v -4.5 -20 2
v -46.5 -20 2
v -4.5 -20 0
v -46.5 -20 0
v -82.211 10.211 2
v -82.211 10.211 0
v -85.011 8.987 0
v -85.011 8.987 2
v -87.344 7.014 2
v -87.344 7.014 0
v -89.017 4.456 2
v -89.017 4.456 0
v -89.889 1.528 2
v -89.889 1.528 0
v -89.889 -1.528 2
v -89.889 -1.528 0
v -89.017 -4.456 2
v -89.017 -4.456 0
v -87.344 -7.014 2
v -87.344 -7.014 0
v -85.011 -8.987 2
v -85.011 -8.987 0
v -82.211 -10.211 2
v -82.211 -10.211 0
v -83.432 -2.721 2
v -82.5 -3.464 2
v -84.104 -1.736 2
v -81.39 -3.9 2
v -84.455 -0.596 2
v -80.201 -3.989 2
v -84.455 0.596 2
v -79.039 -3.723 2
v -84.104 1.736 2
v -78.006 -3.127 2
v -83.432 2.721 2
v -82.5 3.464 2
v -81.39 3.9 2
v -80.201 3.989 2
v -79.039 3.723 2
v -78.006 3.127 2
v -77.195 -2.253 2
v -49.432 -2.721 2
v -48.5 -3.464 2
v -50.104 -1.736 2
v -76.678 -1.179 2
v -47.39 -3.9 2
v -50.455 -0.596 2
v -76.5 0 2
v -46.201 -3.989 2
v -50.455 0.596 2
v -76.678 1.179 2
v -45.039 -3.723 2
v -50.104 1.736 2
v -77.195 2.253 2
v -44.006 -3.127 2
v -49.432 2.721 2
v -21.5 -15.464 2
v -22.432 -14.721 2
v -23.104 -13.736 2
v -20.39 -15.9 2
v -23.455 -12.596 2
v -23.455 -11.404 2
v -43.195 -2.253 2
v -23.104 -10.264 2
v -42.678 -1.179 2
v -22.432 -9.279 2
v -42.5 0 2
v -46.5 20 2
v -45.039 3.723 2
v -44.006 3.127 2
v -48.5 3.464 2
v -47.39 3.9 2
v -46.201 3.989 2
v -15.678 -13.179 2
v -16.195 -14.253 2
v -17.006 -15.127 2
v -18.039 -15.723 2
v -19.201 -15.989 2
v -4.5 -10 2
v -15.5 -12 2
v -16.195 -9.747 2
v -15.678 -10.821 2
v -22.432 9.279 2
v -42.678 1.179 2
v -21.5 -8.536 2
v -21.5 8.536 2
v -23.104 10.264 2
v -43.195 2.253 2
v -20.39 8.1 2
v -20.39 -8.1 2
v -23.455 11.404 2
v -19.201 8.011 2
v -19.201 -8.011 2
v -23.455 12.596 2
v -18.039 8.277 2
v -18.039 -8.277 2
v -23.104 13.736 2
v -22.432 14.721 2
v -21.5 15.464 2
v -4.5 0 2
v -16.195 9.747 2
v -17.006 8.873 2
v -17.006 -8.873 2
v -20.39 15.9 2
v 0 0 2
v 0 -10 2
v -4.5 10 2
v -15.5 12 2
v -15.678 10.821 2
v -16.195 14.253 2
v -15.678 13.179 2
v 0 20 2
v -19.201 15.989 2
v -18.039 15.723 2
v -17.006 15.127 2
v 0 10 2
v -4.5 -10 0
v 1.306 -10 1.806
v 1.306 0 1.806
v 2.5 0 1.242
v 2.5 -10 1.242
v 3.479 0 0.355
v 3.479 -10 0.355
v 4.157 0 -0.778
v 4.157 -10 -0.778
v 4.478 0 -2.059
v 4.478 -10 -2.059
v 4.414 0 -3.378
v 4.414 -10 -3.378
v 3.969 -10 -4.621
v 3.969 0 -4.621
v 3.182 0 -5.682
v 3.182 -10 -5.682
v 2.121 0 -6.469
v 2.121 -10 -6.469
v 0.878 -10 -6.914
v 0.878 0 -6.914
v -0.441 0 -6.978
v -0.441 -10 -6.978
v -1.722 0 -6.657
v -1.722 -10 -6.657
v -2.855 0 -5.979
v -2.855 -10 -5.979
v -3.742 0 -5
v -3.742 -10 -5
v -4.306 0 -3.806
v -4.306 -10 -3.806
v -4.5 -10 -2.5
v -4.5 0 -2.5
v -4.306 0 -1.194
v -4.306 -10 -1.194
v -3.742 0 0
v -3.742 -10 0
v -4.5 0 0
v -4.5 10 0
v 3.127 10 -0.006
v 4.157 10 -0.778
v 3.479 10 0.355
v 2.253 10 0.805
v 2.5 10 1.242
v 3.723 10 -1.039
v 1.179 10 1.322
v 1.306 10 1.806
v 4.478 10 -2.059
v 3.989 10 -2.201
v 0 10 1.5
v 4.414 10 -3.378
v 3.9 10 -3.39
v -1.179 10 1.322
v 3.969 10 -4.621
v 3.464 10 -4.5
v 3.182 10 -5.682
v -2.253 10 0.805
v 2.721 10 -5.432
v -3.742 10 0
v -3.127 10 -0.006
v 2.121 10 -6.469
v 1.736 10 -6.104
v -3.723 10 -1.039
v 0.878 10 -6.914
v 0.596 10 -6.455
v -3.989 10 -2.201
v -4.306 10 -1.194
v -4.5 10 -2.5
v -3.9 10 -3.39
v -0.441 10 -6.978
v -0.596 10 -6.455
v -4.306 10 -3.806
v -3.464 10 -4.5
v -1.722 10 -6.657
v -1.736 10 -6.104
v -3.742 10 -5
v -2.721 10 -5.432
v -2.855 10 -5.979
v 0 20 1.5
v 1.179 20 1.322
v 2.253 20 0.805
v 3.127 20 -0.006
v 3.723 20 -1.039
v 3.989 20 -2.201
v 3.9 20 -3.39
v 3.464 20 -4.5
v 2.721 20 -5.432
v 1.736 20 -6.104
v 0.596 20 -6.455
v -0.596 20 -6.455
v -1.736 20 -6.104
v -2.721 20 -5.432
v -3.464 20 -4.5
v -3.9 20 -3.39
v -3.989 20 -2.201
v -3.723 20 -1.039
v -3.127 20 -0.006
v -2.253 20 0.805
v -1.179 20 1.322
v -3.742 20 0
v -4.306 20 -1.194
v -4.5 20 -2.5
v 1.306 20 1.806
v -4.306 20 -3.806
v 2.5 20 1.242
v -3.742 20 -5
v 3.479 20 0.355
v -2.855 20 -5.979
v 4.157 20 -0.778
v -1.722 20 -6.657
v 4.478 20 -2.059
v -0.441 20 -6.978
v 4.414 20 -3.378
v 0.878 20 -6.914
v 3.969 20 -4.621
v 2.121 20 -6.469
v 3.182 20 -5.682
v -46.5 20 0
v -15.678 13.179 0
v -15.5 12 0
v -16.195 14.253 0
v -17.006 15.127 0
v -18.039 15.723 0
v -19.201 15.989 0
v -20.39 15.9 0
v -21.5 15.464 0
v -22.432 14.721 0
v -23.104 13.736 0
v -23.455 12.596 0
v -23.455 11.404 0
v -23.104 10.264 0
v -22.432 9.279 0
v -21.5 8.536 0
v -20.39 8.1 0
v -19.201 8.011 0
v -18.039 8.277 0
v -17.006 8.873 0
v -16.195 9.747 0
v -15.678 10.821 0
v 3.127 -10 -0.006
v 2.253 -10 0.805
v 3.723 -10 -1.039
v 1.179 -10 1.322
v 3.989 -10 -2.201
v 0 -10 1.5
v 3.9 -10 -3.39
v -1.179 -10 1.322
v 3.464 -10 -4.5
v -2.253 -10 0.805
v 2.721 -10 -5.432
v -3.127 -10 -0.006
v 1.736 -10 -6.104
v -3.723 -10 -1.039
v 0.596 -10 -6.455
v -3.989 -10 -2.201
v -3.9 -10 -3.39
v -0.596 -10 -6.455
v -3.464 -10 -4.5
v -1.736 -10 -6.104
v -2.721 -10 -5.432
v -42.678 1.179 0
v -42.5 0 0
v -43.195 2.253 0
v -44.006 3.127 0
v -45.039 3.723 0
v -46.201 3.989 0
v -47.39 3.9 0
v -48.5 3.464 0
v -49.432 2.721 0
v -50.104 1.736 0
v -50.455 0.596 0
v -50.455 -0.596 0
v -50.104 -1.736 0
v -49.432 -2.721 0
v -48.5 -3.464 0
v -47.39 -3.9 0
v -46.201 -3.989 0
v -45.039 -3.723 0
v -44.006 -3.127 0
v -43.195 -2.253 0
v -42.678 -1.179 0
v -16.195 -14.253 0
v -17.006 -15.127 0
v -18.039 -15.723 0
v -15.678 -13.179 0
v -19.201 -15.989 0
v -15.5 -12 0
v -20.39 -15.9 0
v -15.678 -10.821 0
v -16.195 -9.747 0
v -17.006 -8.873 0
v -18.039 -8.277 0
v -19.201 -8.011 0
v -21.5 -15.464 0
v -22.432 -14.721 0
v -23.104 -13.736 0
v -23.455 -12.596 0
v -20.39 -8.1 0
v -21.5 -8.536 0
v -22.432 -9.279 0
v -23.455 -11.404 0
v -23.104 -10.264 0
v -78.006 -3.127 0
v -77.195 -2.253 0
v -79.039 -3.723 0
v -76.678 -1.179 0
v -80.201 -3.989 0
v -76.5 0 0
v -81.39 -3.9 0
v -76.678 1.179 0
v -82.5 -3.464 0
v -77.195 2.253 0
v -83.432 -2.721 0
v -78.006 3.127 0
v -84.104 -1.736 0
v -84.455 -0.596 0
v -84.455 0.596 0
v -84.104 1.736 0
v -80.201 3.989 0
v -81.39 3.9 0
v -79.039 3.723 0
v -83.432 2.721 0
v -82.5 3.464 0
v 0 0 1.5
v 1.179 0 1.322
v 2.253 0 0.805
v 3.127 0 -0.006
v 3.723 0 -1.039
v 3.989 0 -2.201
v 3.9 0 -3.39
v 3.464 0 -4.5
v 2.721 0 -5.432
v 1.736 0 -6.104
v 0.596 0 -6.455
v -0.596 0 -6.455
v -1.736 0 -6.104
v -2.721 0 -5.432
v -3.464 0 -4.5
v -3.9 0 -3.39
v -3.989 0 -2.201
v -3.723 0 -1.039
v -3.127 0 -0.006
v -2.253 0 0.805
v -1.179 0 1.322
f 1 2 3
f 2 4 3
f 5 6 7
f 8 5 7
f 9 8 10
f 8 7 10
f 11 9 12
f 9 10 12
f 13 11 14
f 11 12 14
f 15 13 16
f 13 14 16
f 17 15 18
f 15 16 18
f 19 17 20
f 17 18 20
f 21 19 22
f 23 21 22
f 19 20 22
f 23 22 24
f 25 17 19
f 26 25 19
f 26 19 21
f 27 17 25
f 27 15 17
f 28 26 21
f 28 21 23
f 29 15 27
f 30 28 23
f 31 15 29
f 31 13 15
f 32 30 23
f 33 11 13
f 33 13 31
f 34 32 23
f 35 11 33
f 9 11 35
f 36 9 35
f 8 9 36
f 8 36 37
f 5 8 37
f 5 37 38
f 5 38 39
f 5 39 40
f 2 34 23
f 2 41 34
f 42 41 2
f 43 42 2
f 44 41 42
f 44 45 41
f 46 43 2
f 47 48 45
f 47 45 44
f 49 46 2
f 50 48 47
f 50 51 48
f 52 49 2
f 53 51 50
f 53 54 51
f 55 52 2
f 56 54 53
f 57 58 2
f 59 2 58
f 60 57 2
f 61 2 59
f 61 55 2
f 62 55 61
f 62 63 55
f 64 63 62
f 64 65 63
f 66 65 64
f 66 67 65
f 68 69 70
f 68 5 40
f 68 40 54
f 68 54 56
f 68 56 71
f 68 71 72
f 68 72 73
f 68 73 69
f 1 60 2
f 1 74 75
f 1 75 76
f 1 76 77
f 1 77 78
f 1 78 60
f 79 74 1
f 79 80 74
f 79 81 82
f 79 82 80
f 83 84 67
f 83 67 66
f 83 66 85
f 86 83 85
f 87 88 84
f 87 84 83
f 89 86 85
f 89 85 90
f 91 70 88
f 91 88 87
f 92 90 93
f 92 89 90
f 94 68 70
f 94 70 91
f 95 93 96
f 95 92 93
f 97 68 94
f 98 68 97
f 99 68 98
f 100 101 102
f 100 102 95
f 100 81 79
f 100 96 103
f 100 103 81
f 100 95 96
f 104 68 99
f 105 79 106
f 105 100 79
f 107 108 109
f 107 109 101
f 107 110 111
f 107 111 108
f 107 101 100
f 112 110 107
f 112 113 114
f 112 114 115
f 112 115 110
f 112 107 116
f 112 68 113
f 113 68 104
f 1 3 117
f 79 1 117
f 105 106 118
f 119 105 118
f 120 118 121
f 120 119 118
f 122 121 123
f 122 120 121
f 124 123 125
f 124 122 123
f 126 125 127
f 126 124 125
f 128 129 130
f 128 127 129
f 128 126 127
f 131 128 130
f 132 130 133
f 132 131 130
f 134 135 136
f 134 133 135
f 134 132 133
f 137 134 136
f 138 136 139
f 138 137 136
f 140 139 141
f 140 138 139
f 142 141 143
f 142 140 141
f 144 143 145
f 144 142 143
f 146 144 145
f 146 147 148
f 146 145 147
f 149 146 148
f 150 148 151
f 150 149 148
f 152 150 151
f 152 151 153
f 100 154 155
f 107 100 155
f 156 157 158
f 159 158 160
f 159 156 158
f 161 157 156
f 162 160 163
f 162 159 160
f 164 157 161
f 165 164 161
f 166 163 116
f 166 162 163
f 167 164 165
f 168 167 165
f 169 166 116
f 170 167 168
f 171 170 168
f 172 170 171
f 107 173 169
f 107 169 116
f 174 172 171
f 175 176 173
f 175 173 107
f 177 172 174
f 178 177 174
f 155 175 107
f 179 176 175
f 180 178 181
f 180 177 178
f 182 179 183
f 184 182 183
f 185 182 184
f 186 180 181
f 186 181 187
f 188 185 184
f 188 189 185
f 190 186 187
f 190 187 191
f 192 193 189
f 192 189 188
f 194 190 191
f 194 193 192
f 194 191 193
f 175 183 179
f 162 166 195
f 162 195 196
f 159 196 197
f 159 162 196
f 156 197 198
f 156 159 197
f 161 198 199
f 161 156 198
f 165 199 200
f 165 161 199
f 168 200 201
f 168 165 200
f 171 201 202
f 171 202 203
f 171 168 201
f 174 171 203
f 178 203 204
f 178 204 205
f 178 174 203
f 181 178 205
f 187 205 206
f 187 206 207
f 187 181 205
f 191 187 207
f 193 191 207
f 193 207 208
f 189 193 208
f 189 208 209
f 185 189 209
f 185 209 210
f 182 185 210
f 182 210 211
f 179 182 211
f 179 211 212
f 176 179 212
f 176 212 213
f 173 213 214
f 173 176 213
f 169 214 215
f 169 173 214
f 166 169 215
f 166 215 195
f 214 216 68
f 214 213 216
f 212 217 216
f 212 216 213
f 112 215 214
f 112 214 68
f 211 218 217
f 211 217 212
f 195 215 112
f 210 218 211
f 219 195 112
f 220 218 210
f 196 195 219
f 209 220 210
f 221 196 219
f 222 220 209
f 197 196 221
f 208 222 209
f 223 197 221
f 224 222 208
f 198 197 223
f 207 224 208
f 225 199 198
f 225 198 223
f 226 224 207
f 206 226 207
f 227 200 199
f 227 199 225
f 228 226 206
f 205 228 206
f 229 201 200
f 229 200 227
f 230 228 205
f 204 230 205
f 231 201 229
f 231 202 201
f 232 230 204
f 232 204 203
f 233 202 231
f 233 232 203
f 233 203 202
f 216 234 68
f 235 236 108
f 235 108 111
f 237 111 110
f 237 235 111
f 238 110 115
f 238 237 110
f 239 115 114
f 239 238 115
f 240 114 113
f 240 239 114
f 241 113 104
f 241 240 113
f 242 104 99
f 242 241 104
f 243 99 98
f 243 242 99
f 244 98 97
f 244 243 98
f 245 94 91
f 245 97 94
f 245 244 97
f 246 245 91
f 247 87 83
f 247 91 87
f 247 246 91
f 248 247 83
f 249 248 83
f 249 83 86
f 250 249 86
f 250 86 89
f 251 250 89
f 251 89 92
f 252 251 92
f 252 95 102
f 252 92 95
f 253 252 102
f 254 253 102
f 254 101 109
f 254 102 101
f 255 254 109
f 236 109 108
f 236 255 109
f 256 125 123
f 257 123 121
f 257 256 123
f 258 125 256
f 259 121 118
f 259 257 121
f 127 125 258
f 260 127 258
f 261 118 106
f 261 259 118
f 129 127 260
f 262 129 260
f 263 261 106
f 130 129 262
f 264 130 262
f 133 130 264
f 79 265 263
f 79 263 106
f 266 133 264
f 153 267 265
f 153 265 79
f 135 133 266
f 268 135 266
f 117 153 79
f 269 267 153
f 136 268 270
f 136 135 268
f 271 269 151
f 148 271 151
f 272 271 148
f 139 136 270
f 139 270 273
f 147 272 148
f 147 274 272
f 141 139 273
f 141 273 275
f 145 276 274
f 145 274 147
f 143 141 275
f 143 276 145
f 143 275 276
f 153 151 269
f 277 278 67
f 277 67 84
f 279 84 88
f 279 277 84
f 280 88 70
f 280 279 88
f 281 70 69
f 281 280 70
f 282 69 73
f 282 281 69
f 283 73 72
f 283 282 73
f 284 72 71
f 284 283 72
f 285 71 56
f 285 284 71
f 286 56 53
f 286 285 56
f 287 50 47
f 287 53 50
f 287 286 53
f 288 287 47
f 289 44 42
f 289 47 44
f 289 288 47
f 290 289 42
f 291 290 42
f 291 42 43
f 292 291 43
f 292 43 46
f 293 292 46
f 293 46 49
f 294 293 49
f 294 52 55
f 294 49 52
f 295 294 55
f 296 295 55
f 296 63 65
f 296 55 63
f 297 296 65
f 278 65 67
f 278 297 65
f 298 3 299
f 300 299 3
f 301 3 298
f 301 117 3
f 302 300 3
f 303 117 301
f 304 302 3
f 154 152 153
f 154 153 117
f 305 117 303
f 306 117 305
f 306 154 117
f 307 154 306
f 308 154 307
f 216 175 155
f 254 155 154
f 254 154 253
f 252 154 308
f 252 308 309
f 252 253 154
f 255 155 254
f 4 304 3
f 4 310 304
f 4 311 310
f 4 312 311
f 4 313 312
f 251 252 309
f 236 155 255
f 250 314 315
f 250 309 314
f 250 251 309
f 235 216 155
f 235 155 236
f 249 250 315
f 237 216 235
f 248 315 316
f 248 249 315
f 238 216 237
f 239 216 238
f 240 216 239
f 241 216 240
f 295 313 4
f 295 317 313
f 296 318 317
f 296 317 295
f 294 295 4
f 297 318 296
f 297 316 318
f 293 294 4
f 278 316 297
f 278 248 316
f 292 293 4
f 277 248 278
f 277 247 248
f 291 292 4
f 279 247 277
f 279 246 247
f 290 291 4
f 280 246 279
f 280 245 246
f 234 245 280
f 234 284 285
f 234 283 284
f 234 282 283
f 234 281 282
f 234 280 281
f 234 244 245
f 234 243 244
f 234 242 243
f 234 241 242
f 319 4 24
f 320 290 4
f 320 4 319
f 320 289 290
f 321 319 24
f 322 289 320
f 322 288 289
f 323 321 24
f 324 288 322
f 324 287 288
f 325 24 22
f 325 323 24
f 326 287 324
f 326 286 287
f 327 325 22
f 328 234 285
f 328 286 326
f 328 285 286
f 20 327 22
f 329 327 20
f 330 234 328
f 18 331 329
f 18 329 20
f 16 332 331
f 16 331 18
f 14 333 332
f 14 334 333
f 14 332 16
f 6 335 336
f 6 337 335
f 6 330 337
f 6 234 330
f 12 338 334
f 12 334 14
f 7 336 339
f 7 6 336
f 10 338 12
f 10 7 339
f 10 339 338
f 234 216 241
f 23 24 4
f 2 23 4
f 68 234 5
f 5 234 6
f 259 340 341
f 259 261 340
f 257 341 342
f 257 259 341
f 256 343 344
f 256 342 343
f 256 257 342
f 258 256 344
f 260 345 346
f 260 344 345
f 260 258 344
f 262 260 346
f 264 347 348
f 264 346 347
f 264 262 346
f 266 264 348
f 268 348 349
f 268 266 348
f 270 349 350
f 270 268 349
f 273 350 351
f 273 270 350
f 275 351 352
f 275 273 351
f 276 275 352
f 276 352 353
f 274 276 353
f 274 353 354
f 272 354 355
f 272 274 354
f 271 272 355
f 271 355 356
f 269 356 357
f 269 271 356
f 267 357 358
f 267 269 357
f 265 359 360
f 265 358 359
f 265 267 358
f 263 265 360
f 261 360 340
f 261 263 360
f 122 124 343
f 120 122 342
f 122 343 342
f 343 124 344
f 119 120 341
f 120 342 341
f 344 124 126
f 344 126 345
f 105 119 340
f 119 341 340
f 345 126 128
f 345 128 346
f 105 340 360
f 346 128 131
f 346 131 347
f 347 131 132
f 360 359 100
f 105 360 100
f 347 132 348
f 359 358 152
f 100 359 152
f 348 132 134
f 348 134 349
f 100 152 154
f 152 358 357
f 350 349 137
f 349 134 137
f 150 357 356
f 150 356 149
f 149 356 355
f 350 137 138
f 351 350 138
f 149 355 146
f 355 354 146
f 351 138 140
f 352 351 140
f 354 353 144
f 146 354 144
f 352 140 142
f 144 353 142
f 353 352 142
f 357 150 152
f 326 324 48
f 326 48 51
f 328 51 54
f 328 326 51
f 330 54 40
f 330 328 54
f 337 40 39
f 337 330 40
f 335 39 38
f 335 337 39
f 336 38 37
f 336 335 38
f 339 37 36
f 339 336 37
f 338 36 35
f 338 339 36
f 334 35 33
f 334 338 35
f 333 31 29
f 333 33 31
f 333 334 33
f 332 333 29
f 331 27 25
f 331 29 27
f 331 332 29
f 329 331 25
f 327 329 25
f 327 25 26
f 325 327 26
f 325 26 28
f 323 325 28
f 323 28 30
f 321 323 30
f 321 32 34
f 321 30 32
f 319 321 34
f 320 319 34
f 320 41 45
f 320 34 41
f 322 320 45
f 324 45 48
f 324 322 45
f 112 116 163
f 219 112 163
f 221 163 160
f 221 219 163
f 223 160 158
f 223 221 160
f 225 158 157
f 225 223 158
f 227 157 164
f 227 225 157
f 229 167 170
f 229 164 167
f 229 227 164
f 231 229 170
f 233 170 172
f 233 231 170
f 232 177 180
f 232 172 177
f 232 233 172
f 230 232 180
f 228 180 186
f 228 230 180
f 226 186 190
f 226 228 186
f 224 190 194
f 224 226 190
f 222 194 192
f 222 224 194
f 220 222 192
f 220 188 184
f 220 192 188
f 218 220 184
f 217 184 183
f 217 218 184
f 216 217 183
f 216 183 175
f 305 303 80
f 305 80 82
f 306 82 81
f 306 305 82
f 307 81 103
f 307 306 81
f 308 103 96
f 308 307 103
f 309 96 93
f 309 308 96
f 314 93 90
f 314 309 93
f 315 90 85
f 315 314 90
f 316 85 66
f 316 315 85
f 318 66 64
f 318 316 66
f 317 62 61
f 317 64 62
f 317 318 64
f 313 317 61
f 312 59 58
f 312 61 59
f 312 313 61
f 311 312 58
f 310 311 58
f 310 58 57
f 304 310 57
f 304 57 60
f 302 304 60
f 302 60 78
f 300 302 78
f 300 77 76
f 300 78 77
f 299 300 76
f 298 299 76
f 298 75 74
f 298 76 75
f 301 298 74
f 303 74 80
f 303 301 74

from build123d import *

# Parameters (mm, degrees)
BOSS_EXTRUDE1_DEPTH     = 2
SKETCH12_R              = 4.5
SKETCH12_R_2            = 4
BOSS_EXTRUDE12_DEPTH    = 20
CUT_EXTRUDE1_DEPTH      = 93.460802506
CUT_EXTRUDE1_DEPTH_BACK = 93.460802506
SKETCH3_R               = 4


with BuildPart() as part:
    # Sketch2 → Boss-Extrude1 (new body)
    with BuildSketch(Plane.XY):
        with BuildLine():
            Line((-4, 20), (-46.5, 20))
            Line((-46.5, 20), (-82.211080106, 10.211252251))
            ThreePointArc((-82.211080106, 10.211252251), (-90, 0), (-82.211080106, -10.211252251))
            Line((-82.211080106, -10.211252251), (-46.5, -20))
            Line((-46.5, -20), (-4, -20))
            Line((-4, -20), (-4, -10))
            Line((-4, -10), (-4, 0))
            Line((-4, 0), (-4, 10))
            Line((-4, 10), (-4, 20))
        make_face()
    extrude(amount=BOSS_EXTRUDE1_DEPTH)

    # Sketch12 → Boss-Extrude12 (add, symmetric)
    # profile 1 of 2: a face of its own
    with BuildSketch(Plane(origin=(0, 0, 0), x_dir=(1, 0, 0), z_dir=(0, 1, 0))):
        with Locations((0, 2.5)):
            Circle(SKETCH12_R)
        with Locations(Location((0, 2.5, 0), (0, 0, 270))):
            Circle(SKETCH12_R_2, mode=Mode.SUBTRACT)
    # profile 2 of 2: a face of its own
    with BuildSketch(Plane(origin=(0, 0, 0), x_dir=(1, 0, 0), z_dir=(0, 1, 0))):
        with BuildLine():
            Line((-4, 0), (-4, -2))
            Line((-4, -2), (0, -2))
            ThreePointArc((0, -2), (-2.121320344, -1.468626967), (-3.741657387, 0))
            Line((-3.741657387, 0), (-4, 0))
        make_face()
    extrude(amount=BOSS_EXTRUDE12_DEPTH, both=True)

    # Sketch3 → Cut-Extrude1 (cut, two sides: drawn at the far end of the back side and taken through both)
    with BuildSketch(Plane.XY.offset(-CUT_EXTRUDE1_DEPTH_BACK)):
        with Locations((-19.5, -12)):
            Circle(SKETCH3_R)
        with Locations((-19.5, 12)):
            Circle(SKETCH3_R)
        with Locations((-46.5, 0)):
            Circle(SKETCH3_R)
        with Locations((-80.5, 0)):
            Circle(SKETCH3_R)
        Polygon((0, 10), (4.5, 10), (4.5, 0), (-4.5, 0), (-4.5, 10), align=None)
        Polygon((0, -10), (4.5, -10), (4.5, -20), (0, -20), (-4.5, -20), (-4.5, -10), align=None)
    extrude(amount=CUT_EXTRUDE1_DEPTH + CUT_EXTRUDE1_DEPTH_BACK, mode=Mode.SUBTRACT)


solid = part.part
